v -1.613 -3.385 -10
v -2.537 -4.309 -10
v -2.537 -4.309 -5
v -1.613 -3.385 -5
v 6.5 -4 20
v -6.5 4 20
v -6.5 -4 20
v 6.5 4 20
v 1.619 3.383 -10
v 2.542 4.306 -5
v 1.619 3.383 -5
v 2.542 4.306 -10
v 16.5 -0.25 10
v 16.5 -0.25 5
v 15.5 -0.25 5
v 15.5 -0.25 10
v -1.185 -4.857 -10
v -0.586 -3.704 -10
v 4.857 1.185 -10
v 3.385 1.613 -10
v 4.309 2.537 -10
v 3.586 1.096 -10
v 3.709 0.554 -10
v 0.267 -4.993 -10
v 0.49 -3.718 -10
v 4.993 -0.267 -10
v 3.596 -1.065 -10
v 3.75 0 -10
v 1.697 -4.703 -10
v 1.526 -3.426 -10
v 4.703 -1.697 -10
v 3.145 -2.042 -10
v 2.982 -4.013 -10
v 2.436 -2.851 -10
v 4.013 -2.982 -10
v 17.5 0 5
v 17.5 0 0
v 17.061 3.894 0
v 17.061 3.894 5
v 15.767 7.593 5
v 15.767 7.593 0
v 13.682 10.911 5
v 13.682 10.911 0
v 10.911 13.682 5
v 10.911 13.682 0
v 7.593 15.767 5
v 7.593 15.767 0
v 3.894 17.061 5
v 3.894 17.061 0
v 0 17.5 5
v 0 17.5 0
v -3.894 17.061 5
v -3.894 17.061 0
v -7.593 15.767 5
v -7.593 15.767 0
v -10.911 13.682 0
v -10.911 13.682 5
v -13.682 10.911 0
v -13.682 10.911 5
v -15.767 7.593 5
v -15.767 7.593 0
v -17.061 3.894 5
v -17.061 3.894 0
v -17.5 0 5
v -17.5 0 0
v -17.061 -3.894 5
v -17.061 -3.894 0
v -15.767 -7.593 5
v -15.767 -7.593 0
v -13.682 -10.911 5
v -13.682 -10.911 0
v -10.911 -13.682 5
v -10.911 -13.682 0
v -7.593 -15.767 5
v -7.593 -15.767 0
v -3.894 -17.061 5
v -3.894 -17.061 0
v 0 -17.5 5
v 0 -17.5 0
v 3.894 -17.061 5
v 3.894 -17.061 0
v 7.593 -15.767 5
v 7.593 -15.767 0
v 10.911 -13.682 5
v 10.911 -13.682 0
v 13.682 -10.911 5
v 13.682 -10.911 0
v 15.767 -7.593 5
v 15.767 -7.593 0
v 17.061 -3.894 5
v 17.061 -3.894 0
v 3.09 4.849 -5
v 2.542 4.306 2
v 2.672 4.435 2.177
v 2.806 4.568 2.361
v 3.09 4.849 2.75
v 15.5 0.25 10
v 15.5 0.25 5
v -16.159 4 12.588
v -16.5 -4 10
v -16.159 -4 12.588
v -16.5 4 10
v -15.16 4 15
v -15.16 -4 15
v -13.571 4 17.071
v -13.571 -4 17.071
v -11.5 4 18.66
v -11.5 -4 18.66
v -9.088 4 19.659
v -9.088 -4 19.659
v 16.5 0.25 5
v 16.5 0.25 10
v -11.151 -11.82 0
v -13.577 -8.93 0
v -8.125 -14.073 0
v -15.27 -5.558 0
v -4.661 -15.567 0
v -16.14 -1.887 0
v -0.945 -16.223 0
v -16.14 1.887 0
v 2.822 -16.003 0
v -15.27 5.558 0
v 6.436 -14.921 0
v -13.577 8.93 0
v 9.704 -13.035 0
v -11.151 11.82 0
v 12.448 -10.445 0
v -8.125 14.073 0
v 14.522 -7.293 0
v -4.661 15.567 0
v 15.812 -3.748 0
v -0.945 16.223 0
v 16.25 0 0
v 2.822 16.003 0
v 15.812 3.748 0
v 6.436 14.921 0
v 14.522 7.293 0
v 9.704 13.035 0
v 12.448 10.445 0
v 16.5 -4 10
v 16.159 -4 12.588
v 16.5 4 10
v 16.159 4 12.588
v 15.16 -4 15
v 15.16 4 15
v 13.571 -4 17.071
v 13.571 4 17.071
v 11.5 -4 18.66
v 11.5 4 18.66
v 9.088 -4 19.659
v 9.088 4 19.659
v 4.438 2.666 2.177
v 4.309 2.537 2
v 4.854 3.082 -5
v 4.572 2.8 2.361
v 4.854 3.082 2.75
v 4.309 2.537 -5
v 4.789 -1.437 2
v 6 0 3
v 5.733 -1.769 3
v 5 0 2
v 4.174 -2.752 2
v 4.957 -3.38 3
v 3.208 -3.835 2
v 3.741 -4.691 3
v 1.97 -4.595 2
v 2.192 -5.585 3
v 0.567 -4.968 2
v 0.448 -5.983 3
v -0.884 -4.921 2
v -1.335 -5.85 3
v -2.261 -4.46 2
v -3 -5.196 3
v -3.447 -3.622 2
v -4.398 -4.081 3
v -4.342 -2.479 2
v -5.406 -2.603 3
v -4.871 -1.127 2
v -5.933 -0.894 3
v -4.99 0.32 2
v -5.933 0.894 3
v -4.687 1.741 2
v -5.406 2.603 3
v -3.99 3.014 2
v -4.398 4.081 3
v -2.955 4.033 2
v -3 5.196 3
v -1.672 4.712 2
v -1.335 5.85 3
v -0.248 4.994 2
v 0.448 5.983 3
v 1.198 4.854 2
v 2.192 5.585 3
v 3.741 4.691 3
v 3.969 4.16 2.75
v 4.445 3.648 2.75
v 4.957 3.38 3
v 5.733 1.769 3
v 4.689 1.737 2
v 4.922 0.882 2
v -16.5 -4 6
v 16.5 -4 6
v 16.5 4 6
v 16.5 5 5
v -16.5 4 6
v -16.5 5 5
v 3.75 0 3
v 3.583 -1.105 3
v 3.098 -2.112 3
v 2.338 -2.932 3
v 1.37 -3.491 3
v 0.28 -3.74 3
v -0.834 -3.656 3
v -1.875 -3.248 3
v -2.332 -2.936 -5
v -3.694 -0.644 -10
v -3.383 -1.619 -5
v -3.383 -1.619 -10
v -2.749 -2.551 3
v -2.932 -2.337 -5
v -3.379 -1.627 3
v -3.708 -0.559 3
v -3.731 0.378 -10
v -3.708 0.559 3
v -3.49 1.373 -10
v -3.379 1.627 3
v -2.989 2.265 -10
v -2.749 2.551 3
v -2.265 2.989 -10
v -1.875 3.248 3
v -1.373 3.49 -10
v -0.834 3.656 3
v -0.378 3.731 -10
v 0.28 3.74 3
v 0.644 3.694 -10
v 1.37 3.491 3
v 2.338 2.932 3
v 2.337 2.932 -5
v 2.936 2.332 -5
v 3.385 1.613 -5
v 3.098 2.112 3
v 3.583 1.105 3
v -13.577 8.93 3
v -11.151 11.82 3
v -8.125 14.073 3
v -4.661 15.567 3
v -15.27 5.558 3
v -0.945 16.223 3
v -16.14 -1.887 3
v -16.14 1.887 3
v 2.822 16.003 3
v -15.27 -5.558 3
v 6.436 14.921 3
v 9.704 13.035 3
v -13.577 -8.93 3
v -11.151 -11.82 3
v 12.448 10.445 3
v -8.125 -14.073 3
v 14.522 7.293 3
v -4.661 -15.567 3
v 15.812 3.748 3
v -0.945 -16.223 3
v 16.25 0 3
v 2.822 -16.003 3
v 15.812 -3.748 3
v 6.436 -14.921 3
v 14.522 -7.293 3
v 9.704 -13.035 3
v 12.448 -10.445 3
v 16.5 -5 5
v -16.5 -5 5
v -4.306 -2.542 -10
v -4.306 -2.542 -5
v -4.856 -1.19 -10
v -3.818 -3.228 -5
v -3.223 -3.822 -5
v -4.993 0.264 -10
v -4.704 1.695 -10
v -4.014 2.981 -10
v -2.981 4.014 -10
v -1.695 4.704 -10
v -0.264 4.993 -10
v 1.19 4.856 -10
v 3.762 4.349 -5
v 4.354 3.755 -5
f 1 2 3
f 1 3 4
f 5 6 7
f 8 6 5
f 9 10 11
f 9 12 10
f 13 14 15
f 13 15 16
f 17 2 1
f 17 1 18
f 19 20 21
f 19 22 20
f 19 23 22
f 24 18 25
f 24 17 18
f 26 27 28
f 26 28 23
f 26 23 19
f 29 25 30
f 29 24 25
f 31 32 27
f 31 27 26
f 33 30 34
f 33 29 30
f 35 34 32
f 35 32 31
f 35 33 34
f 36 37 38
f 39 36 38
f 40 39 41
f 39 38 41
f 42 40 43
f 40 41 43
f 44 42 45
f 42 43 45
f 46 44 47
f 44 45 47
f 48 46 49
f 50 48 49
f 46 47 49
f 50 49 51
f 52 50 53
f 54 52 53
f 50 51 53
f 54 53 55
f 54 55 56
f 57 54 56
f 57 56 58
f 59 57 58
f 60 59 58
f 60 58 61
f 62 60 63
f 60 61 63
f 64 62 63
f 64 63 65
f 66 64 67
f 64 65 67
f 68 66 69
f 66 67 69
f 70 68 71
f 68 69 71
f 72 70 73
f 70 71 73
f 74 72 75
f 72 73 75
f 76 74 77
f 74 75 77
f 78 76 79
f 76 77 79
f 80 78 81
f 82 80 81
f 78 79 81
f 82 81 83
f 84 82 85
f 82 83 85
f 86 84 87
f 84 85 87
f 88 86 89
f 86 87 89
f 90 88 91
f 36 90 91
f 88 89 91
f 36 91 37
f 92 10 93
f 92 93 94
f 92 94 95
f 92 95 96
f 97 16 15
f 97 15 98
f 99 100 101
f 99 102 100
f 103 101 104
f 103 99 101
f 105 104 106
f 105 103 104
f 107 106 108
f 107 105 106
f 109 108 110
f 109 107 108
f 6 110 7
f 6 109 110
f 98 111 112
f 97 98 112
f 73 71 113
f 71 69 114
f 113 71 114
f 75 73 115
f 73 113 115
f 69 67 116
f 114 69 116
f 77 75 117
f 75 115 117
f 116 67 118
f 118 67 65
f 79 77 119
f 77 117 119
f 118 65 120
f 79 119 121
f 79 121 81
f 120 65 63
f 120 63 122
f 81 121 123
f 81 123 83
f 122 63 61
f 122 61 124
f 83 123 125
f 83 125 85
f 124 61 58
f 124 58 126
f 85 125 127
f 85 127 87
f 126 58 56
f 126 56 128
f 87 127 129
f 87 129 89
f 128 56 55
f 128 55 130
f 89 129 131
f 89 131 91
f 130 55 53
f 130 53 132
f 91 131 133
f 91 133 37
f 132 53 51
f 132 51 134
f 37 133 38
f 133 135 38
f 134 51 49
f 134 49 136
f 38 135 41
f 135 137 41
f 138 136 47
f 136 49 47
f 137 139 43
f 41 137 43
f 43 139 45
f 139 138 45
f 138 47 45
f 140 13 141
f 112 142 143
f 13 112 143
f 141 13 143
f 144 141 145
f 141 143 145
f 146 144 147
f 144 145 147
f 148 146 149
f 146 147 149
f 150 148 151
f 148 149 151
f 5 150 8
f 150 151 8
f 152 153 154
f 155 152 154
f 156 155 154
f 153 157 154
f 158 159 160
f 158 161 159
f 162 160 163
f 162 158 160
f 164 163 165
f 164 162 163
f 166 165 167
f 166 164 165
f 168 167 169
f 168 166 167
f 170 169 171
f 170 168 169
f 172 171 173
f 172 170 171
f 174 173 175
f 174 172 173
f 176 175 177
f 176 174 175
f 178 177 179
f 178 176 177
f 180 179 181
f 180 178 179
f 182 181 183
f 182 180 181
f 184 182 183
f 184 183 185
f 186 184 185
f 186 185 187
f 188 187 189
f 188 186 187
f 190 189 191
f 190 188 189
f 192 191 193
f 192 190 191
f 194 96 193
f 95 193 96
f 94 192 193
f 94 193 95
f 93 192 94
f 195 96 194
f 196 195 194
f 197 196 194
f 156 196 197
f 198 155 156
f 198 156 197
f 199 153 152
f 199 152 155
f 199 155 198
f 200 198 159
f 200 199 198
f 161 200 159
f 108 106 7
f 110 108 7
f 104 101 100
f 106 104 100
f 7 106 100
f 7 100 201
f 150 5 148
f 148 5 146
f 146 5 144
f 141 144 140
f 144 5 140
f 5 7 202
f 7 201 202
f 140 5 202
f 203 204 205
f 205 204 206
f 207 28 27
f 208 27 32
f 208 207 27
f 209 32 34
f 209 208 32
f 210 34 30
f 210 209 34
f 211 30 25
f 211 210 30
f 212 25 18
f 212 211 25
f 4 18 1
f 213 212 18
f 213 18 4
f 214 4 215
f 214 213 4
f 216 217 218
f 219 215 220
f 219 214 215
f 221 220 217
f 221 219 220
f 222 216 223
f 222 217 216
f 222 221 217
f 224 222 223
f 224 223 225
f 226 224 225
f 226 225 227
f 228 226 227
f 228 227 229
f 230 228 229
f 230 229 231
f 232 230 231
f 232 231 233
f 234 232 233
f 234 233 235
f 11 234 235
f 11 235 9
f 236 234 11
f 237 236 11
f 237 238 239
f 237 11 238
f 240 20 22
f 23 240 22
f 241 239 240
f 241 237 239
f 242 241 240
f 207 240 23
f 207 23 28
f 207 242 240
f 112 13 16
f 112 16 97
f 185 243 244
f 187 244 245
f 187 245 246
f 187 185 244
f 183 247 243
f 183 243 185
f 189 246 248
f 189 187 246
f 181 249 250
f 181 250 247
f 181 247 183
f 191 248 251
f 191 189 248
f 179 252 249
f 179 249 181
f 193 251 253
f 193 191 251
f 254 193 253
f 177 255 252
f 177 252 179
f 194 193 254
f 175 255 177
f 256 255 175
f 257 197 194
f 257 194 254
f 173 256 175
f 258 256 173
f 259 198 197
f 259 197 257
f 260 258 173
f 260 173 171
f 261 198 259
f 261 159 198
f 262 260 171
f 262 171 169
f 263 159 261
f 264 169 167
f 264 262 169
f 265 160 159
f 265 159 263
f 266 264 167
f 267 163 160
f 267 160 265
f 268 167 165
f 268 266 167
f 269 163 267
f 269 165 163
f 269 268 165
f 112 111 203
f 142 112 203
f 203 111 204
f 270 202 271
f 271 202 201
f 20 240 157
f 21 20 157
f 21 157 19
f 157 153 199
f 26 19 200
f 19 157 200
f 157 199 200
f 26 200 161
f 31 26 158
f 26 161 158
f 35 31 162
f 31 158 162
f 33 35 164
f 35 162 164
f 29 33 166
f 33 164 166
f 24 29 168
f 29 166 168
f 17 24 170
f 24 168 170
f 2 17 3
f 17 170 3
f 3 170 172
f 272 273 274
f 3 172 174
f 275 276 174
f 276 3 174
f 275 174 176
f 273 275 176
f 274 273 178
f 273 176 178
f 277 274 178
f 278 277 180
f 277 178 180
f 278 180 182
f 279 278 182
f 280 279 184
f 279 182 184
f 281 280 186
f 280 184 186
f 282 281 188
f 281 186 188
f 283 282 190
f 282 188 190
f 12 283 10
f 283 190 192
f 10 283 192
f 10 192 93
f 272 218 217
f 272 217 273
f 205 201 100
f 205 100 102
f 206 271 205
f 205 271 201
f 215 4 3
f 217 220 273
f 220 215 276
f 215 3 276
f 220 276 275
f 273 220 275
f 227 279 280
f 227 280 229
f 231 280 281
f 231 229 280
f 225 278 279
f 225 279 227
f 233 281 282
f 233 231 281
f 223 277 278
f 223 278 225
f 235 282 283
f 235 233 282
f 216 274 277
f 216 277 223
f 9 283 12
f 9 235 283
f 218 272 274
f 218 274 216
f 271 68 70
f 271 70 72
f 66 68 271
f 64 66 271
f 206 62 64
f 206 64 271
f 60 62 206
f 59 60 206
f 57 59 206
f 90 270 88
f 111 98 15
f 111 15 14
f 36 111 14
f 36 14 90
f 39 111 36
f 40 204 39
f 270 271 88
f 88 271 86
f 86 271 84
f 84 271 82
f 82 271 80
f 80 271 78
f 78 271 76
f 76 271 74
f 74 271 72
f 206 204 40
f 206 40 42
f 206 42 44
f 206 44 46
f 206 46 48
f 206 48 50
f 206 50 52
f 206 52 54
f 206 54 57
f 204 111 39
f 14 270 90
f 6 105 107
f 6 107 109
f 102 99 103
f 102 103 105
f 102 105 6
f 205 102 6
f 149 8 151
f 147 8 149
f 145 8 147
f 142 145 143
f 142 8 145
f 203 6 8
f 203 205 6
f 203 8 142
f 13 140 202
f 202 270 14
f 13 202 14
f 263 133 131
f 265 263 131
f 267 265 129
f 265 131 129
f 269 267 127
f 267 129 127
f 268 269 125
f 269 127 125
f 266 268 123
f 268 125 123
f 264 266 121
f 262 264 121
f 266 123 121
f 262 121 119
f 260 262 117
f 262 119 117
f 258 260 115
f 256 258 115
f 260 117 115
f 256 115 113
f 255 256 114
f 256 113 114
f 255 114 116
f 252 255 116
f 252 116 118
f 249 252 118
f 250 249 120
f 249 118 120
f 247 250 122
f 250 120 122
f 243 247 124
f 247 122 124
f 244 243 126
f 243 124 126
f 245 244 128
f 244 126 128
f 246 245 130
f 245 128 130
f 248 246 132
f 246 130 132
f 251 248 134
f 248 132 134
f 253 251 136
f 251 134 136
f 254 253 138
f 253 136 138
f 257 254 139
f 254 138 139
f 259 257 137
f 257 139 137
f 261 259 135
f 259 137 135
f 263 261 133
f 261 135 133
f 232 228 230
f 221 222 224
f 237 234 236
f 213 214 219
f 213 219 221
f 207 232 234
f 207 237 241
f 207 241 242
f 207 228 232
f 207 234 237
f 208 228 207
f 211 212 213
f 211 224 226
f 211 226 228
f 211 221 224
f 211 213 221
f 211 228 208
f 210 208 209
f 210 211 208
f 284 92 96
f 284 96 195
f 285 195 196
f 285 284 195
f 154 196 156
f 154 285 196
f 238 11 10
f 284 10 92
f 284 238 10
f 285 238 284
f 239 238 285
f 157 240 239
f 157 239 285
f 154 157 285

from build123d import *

# Parameters (mm, degrees)
SKETCH_R        = 17.5
PAD_DEPTH       = 5
SKETCH001_W     = 33
SKETCH001_H     = 8
PAD001_DEPTH    = 20
FILLET_R        = 10
CHAMFER_SIZE    = 1
SKETCH002_R     = 16.25
POCKET_DEPTH    = 3
SKETCH003_R     = 5
SKETCH003_R_2   = 3.75
PAD002_DEPTH    = 13
CHAMFER001_SIZE = 1
POCKET001_DEPTH = 5
PAD003_DEPTH    = 8
SKETCH006_W     = 0.5
SKETCH006_H     = 5
POCKET002_DEPTH = 1


with BuildPart() as part:
    # Sketch → Pad (new body)
    with BuildSketch(Plane.XY):
        Circle(SKETCH_R)
    extrude(amount=PAD_DEPTH)

    # Sketch001 → Pad001 (join)
    with BuildSketch(Plane.XY):
        Rectangle(SKETCH001_W, SKETCH001_H)
    extrude(amount=PAD001_DEPTH)

    # Fillet
    fillet_edges = [part.edges().sort_by_distance(p)[0] for p in [
        (-16.5, 0, 20),
        (16.5, 0, 20),
    ]]
    fillet(fillet_edges, radius=FILLET_R)

    # Chamfer
    chamfer_edges = [part.edges().sort_by_distance(p)[0] for p in [
        (0, -4, 5),
        (0, 4, 5),
    ]]
    chamfer(chamfer_edges, length=CHAMFER_SIZE)

    # Sketch002 (on Face12 of Chamfer) → Pocket (cut)
    with BuildSketch(Plane(origin=(0, 0, 0), x_dir=(1, 0, 0), z_dir=(0, 0, -1))):
        Circle(SKETCH002_R)
    extrude(amount=-POCKET_DEPTH, mode=Mode.SUBTRACT)

    # Sketch003 (on Face16 of Pocket) → Pad002 (join)
    with BuildSketch(Plane(origin=(0, 0, 3), x_dir=(1, 0, 0), z_dir=(0, 0, -1))):
        Circle(SKETCH003_R)
        Circle(SKETCH003_R_2, mode=Mode.SUBTRACT)
    extrude(amount=PAD002_DEPTH)

    # Chamfer001
    chamfer001_edges = [part.edges().sort_by_distance(p)[0] for p in [
        (-5, 0, 3),
    ]]
    chamfer(chamfer001_edges, length=CHAMFER001_SIZE)

    # Sketch004 (on Face8 of Chamfer001) → Pocket001 (cut)
    with BuildSketch(Plane(origin=(0, 0, -10), x_dir=(1, 0, 0), z_dir=(0, 0, -1))):
        Polygon((-3.071599, 4.843548), (4.621057, -2.849107), (2.85329, -4.616874), (-4.839366, 3.075782), align=None)
    extrude(amount=-POCKET001_DEPTH, mode=Mode.SUBTRACT)

    # Sketch005 (on Face10 of Pocket001) → Pad003 (join)
    with BuildSketch(Plane(origin=(0, 0, -5), x_dir=(1, 0, 0), z_dir=(0, 0, -1))):
        with BuildLine():
            ThreePointArc((3.089579, -4.849433), (4.069086, -4.062639), (4.854326, -3.081886))
            Line((4.3087, -2.53675), (4.854326, -3.081886))
            ThreePointArc((2.542013, -4.305597), (3.537693, -3.533373), (4.3087, -2.53675))
            Line((2.542013, -4.305597), (3.089579, -4.849433))
        make_face()
    extrude(amount=-PAD003_DEPTH)

    # Sketch006 (on Face27 of Pad003) → Pocket002 (cut)
    with BuildSketch(Plane.YZ.offset(16.5)):
        with Locations((0, 7.5)):
            Rectangle(SKETCH006_W, SKETCH006_H)
    extrude(amount=-POCKET002_DEPTH, mode=Mode.SUBTRACT)


solid = part.part
